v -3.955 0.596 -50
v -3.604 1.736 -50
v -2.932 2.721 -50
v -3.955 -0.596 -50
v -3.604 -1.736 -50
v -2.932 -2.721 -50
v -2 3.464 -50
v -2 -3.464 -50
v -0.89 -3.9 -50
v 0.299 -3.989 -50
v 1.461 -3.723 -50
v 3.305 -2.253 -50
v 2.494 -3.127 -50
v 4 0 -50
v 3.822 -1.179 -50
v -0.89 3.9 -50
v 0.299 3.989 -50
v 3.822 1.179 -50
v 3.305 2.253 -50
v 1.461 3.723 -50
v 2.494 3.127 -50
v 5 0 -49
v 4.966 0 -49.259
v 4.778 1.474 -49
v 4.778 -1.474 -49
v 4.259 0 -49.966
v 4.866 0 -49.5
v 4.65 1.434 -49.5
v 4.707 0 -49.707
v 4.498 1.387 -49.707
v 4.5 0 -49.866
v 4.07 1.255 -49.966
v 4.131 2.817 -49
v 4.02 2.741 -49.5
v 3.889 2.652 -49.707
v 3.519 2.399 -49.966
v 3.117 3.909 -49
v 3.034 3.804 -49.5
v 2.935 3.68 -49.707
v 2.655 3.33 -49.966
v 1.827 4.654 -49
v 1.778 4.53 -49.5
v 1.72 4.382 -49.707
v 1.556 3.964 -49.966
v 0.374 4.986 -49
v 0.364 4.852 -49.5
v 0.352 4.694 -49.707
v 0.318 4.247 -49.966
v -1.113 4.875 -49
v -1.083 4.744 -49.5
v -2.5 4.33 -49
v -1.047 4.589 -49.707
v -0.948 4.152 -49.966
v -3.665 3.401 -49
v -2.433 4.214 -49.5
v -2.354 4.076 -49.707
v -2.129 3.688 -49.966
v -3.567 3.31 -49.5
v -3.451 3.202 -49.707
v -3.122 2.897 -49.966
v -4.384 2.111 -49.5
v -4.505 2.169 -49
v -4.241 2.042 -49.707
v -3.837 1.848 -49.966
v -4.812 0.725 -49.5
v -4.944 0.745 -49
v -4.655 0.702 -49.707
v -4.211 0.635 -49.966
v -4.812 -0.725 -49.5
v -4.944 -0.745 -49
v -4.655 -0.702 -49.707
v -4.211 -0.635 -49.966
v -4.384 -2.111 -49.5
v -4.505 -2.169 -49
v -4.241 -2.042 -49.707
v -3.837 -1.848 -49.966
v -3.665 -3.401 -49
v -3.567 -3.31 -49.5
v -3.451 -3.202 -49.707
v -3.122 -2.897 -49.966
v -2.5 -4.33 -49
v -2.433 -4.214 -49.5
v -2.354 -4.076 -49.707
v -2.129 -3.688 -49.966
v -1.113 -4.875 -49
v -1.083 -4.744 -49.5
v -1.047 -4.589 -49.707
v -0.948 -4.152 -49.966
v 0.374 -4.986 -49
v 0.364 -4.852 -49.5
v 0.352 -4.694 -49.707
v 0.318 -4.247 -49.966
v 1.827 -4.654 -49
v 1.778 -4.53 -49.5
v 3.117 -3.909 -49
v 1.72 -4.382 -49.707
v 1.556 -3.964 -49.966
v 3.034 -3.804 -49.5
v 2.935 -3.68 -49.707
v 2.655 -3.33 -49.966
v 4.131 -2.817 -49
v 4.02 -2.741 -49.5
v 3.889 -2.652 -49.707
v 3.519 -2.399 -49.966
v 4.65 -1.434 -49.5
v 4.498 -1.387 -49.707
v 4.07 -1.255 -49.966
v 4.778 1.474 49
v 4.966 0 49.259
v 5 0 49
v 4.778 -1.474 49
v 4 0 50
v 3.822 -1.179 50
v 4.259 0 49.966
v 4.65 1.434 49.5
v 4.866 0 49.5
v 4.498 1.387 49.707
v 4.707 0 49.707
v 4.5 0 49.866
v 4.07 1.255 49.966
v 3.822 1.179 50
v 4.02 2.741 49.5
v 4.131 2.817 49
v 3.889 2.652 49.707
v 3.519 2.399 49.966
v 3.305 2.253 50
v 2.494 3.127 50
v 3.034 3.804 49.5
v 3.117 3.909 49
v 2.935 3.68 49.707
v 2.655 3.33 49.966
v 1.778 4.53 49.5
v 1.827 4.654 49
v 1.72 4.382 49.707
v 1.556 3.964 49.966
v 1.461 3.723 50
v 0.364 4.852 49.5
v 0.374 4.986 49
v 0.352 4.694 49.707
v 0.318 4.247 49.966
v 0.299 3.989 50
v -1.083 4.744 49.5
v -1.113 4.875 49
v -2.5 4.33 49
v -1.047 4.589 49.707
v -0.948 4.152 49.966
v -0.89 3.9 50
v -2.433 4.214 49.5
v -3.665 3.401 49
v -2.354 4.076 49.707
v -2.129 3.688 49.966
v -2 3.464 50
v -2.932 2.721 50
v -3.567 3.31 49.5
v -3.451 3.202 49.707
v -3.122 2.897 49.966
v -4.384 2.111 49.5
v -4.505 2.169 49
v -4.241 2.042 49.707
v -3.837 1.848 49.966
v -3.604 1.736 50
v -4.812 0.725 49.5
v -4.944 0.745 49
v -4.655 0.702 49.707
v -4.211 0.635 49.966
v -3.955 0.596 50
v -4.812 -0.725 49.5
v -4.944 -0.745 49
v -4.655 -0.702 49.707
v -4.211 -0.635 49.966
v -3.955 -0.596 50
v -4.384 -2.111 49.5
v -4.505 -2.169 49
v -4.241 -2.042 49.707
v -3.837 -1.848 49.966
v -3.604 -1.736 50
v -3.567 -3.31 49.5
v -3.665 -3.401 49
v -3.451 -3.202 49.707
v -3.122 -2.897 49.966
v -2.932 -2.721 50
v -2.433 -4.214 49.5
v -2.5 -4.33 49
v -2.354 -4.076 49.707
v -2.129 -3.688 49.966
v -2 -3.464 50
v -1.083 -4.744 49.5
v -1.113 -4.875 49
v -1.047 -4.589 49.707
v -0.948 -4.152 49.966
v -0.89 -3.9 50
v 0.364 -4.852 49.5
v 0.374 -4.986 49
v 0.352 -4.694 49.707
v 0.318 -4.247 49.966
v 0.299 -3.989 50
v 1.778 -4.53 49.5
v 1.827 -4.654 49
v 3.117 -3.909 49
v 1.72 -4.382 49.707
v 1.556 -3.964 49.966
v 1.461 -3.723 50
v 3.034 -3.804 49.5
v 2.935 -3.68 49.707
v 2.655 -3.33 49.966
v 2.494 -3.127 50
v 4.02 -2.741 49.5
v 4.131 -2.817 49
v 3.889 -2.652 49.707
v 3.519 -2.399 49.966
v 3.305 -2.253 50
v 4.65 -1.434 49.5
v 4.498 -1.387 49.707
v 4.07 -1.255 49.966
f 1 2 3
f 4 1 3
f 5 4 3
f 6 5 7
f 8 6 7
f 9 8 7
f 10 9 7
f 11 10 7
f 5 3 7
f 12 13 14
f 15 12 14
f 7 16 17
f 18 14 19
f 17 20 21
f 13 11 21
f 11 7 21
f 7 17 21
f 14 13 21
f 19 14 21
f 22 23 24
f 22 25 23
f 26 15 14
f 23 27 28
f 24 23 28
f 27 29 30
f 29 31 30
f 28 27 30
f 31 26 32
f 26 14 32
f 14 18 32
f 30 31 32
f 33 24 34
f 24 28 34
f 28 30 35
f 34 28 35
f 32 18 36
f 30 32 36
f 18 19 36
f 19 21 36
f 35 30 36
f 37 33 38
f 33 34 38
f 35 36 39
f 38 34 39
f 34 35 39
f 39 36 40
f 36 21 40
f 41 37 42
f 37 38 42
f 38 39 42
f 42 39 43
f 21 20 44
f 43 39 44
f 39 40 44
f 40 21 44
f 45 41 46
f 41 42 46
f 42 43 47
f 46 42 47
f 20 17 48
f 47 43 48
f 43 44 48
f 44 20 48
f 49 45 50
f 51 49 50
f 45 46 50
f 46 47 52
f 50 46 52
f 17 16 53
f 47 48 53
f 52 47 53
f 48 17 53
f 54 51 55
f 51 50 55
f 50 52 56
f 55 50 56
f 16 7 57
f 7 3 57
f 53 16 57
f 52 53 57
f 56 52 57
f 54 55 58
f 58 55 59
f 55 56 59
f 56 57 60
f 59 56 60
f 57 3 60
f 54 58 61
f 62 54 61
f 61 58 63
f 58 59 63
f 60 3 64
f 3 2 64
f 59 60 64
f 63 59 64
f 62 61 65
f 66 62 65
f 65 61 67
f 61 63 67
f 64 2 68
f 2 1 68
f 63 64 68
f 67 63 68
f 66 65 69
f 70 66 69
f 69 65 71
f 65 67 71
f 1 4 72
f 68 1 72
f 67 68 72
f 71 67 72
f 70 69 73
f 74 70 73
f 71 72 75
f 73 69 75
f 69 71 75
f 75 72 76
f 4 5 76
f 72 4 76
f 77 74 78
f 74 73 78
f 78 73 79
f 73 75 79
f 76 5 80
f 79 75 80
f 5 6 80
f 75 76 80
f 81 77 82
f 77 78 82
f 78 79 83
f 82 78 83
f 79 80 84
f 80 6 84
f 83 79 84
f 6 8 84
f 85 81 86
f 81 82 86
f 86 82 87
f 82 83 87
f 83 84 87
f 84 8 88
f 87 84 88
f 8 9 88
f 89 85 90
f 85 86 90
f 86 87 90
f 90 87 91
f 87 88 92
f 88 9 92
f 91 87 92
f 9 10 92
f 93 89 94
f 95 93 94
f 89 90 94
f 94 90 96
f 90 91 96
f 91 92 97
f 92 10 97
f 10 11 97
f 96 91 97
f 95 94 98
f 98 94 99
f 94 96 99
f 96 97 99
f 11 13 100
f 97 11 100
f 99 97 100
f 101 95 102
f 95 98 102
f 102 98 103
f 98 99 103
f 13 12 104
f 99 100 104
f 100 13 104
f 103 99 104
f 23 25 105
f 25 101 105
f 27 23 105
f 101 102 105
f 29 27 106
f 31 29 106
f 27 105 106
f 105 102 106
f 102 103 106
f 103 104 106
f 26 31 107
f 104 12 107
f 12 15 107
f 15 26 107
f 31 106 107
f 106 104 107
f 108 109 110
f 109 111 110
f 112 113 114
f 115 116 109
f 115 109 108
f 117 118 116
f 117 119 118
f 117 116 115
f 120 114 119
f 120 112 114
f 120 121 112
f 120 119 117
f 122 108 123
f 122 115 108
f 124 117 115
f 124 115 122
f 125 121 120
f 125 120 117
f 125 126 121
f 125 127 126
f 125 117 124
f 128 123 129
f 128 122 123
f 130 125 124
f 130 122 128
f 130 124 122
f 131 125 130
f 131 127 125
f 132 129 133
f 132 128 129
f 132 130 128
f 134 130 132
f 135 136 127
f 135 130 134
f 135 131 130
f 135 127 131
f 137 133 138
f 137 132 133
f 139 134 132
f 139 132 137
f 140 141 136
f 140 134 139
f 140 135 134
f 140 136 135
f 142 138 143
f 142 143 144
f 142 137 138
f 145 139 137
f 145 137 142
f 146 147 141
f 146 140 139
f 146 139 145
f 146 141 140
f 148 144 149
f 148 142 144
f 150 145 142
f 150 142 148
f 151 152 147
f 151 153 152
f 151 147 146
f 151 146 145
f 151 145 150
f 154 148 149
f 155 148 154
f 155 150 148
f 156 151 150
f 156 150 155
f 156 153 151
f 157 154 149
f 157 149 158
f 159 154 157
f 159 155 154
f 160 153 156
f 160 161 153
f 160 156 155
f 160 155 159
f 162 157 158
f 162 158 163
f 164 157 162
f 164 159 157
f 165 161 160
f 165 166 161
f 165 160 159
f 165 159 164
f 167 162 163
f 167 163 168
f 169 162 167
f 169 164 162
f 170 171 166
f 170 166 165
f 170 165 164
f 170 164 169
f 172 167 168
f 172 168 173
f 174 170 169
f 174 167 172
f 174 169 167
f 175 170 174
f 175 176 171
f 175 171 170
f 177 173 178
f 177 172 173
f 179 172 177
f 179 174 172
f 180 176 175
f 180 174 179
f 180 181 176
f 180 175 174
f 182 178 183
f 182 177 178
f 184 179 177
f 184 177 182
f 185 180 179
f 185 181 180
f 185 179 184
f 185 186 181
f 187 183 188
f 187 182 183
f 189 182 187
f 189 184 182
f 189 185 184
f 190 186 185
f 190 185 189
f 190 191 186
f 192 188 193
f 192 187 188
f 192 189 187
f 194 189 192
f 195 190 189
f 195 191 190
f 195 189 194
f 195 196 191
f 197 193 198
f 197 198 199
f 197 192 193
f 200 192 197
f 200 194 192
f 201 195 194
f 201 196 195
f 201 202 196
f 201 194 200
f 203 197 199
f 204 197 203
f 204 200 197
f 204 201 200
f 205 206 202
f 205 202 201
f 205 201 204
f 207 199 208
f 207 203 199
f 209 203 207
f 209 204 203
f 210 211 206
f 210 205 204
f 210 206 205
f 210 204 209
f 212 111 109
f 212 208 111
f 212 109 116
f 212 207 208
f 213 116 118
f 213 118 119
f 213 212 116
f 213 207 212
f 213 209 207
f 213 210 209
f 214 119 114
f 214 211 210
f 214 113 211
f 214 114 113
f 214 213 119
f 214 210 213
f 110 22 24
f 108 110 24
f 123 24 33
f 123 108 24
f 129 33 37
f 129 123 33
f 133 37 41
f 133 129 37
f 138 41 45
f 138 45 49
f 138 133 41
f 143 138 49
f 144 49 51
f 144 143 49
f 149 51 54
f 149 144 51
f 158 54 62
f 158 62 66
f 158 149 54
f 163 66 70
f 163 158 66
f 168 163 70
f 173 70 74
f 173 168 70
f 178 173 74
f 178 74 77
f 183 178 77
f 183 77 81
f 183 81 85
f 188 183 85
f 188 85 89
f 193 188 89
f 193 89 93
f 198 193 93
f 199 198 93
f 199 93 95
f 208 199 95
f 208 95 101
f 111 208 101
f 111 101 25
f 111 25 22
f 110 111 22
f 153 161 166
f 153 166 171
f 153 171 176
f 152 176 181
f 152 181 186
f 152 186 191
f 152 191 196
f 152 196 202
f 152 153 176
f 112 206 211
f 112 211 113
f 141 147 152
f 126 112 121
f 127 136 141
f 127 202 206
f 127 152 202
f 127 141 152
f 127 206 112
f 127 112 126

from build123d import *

# Parameters (mm, degrees)
F0_R     = 5
F1_DEPTH = 50
F2_R     = 1
F3_R     = 1


with BuildPart() as f1:
    # F0 (on Top) → F1 (new body, symmetric)
    with BuildSketch(Plane.XY):
        Circle(F0_R)
    extrude(amount=F1_DEPTH, both=True)

    # F2
    f2_edges = [f1.edges().sort_by_distance(p)[0] for p in [
        (-5, 0, 50),
    ]]
    fillet(f2_edges, radius=F2_R)

    # F3
    f3_edges = [f1.edges().sort_by_distance(p)[0] for p in [
        (-5, 0, -50),
    ]]
    fillet(f3_edges, radius=F3_R)


solid = f1.part
